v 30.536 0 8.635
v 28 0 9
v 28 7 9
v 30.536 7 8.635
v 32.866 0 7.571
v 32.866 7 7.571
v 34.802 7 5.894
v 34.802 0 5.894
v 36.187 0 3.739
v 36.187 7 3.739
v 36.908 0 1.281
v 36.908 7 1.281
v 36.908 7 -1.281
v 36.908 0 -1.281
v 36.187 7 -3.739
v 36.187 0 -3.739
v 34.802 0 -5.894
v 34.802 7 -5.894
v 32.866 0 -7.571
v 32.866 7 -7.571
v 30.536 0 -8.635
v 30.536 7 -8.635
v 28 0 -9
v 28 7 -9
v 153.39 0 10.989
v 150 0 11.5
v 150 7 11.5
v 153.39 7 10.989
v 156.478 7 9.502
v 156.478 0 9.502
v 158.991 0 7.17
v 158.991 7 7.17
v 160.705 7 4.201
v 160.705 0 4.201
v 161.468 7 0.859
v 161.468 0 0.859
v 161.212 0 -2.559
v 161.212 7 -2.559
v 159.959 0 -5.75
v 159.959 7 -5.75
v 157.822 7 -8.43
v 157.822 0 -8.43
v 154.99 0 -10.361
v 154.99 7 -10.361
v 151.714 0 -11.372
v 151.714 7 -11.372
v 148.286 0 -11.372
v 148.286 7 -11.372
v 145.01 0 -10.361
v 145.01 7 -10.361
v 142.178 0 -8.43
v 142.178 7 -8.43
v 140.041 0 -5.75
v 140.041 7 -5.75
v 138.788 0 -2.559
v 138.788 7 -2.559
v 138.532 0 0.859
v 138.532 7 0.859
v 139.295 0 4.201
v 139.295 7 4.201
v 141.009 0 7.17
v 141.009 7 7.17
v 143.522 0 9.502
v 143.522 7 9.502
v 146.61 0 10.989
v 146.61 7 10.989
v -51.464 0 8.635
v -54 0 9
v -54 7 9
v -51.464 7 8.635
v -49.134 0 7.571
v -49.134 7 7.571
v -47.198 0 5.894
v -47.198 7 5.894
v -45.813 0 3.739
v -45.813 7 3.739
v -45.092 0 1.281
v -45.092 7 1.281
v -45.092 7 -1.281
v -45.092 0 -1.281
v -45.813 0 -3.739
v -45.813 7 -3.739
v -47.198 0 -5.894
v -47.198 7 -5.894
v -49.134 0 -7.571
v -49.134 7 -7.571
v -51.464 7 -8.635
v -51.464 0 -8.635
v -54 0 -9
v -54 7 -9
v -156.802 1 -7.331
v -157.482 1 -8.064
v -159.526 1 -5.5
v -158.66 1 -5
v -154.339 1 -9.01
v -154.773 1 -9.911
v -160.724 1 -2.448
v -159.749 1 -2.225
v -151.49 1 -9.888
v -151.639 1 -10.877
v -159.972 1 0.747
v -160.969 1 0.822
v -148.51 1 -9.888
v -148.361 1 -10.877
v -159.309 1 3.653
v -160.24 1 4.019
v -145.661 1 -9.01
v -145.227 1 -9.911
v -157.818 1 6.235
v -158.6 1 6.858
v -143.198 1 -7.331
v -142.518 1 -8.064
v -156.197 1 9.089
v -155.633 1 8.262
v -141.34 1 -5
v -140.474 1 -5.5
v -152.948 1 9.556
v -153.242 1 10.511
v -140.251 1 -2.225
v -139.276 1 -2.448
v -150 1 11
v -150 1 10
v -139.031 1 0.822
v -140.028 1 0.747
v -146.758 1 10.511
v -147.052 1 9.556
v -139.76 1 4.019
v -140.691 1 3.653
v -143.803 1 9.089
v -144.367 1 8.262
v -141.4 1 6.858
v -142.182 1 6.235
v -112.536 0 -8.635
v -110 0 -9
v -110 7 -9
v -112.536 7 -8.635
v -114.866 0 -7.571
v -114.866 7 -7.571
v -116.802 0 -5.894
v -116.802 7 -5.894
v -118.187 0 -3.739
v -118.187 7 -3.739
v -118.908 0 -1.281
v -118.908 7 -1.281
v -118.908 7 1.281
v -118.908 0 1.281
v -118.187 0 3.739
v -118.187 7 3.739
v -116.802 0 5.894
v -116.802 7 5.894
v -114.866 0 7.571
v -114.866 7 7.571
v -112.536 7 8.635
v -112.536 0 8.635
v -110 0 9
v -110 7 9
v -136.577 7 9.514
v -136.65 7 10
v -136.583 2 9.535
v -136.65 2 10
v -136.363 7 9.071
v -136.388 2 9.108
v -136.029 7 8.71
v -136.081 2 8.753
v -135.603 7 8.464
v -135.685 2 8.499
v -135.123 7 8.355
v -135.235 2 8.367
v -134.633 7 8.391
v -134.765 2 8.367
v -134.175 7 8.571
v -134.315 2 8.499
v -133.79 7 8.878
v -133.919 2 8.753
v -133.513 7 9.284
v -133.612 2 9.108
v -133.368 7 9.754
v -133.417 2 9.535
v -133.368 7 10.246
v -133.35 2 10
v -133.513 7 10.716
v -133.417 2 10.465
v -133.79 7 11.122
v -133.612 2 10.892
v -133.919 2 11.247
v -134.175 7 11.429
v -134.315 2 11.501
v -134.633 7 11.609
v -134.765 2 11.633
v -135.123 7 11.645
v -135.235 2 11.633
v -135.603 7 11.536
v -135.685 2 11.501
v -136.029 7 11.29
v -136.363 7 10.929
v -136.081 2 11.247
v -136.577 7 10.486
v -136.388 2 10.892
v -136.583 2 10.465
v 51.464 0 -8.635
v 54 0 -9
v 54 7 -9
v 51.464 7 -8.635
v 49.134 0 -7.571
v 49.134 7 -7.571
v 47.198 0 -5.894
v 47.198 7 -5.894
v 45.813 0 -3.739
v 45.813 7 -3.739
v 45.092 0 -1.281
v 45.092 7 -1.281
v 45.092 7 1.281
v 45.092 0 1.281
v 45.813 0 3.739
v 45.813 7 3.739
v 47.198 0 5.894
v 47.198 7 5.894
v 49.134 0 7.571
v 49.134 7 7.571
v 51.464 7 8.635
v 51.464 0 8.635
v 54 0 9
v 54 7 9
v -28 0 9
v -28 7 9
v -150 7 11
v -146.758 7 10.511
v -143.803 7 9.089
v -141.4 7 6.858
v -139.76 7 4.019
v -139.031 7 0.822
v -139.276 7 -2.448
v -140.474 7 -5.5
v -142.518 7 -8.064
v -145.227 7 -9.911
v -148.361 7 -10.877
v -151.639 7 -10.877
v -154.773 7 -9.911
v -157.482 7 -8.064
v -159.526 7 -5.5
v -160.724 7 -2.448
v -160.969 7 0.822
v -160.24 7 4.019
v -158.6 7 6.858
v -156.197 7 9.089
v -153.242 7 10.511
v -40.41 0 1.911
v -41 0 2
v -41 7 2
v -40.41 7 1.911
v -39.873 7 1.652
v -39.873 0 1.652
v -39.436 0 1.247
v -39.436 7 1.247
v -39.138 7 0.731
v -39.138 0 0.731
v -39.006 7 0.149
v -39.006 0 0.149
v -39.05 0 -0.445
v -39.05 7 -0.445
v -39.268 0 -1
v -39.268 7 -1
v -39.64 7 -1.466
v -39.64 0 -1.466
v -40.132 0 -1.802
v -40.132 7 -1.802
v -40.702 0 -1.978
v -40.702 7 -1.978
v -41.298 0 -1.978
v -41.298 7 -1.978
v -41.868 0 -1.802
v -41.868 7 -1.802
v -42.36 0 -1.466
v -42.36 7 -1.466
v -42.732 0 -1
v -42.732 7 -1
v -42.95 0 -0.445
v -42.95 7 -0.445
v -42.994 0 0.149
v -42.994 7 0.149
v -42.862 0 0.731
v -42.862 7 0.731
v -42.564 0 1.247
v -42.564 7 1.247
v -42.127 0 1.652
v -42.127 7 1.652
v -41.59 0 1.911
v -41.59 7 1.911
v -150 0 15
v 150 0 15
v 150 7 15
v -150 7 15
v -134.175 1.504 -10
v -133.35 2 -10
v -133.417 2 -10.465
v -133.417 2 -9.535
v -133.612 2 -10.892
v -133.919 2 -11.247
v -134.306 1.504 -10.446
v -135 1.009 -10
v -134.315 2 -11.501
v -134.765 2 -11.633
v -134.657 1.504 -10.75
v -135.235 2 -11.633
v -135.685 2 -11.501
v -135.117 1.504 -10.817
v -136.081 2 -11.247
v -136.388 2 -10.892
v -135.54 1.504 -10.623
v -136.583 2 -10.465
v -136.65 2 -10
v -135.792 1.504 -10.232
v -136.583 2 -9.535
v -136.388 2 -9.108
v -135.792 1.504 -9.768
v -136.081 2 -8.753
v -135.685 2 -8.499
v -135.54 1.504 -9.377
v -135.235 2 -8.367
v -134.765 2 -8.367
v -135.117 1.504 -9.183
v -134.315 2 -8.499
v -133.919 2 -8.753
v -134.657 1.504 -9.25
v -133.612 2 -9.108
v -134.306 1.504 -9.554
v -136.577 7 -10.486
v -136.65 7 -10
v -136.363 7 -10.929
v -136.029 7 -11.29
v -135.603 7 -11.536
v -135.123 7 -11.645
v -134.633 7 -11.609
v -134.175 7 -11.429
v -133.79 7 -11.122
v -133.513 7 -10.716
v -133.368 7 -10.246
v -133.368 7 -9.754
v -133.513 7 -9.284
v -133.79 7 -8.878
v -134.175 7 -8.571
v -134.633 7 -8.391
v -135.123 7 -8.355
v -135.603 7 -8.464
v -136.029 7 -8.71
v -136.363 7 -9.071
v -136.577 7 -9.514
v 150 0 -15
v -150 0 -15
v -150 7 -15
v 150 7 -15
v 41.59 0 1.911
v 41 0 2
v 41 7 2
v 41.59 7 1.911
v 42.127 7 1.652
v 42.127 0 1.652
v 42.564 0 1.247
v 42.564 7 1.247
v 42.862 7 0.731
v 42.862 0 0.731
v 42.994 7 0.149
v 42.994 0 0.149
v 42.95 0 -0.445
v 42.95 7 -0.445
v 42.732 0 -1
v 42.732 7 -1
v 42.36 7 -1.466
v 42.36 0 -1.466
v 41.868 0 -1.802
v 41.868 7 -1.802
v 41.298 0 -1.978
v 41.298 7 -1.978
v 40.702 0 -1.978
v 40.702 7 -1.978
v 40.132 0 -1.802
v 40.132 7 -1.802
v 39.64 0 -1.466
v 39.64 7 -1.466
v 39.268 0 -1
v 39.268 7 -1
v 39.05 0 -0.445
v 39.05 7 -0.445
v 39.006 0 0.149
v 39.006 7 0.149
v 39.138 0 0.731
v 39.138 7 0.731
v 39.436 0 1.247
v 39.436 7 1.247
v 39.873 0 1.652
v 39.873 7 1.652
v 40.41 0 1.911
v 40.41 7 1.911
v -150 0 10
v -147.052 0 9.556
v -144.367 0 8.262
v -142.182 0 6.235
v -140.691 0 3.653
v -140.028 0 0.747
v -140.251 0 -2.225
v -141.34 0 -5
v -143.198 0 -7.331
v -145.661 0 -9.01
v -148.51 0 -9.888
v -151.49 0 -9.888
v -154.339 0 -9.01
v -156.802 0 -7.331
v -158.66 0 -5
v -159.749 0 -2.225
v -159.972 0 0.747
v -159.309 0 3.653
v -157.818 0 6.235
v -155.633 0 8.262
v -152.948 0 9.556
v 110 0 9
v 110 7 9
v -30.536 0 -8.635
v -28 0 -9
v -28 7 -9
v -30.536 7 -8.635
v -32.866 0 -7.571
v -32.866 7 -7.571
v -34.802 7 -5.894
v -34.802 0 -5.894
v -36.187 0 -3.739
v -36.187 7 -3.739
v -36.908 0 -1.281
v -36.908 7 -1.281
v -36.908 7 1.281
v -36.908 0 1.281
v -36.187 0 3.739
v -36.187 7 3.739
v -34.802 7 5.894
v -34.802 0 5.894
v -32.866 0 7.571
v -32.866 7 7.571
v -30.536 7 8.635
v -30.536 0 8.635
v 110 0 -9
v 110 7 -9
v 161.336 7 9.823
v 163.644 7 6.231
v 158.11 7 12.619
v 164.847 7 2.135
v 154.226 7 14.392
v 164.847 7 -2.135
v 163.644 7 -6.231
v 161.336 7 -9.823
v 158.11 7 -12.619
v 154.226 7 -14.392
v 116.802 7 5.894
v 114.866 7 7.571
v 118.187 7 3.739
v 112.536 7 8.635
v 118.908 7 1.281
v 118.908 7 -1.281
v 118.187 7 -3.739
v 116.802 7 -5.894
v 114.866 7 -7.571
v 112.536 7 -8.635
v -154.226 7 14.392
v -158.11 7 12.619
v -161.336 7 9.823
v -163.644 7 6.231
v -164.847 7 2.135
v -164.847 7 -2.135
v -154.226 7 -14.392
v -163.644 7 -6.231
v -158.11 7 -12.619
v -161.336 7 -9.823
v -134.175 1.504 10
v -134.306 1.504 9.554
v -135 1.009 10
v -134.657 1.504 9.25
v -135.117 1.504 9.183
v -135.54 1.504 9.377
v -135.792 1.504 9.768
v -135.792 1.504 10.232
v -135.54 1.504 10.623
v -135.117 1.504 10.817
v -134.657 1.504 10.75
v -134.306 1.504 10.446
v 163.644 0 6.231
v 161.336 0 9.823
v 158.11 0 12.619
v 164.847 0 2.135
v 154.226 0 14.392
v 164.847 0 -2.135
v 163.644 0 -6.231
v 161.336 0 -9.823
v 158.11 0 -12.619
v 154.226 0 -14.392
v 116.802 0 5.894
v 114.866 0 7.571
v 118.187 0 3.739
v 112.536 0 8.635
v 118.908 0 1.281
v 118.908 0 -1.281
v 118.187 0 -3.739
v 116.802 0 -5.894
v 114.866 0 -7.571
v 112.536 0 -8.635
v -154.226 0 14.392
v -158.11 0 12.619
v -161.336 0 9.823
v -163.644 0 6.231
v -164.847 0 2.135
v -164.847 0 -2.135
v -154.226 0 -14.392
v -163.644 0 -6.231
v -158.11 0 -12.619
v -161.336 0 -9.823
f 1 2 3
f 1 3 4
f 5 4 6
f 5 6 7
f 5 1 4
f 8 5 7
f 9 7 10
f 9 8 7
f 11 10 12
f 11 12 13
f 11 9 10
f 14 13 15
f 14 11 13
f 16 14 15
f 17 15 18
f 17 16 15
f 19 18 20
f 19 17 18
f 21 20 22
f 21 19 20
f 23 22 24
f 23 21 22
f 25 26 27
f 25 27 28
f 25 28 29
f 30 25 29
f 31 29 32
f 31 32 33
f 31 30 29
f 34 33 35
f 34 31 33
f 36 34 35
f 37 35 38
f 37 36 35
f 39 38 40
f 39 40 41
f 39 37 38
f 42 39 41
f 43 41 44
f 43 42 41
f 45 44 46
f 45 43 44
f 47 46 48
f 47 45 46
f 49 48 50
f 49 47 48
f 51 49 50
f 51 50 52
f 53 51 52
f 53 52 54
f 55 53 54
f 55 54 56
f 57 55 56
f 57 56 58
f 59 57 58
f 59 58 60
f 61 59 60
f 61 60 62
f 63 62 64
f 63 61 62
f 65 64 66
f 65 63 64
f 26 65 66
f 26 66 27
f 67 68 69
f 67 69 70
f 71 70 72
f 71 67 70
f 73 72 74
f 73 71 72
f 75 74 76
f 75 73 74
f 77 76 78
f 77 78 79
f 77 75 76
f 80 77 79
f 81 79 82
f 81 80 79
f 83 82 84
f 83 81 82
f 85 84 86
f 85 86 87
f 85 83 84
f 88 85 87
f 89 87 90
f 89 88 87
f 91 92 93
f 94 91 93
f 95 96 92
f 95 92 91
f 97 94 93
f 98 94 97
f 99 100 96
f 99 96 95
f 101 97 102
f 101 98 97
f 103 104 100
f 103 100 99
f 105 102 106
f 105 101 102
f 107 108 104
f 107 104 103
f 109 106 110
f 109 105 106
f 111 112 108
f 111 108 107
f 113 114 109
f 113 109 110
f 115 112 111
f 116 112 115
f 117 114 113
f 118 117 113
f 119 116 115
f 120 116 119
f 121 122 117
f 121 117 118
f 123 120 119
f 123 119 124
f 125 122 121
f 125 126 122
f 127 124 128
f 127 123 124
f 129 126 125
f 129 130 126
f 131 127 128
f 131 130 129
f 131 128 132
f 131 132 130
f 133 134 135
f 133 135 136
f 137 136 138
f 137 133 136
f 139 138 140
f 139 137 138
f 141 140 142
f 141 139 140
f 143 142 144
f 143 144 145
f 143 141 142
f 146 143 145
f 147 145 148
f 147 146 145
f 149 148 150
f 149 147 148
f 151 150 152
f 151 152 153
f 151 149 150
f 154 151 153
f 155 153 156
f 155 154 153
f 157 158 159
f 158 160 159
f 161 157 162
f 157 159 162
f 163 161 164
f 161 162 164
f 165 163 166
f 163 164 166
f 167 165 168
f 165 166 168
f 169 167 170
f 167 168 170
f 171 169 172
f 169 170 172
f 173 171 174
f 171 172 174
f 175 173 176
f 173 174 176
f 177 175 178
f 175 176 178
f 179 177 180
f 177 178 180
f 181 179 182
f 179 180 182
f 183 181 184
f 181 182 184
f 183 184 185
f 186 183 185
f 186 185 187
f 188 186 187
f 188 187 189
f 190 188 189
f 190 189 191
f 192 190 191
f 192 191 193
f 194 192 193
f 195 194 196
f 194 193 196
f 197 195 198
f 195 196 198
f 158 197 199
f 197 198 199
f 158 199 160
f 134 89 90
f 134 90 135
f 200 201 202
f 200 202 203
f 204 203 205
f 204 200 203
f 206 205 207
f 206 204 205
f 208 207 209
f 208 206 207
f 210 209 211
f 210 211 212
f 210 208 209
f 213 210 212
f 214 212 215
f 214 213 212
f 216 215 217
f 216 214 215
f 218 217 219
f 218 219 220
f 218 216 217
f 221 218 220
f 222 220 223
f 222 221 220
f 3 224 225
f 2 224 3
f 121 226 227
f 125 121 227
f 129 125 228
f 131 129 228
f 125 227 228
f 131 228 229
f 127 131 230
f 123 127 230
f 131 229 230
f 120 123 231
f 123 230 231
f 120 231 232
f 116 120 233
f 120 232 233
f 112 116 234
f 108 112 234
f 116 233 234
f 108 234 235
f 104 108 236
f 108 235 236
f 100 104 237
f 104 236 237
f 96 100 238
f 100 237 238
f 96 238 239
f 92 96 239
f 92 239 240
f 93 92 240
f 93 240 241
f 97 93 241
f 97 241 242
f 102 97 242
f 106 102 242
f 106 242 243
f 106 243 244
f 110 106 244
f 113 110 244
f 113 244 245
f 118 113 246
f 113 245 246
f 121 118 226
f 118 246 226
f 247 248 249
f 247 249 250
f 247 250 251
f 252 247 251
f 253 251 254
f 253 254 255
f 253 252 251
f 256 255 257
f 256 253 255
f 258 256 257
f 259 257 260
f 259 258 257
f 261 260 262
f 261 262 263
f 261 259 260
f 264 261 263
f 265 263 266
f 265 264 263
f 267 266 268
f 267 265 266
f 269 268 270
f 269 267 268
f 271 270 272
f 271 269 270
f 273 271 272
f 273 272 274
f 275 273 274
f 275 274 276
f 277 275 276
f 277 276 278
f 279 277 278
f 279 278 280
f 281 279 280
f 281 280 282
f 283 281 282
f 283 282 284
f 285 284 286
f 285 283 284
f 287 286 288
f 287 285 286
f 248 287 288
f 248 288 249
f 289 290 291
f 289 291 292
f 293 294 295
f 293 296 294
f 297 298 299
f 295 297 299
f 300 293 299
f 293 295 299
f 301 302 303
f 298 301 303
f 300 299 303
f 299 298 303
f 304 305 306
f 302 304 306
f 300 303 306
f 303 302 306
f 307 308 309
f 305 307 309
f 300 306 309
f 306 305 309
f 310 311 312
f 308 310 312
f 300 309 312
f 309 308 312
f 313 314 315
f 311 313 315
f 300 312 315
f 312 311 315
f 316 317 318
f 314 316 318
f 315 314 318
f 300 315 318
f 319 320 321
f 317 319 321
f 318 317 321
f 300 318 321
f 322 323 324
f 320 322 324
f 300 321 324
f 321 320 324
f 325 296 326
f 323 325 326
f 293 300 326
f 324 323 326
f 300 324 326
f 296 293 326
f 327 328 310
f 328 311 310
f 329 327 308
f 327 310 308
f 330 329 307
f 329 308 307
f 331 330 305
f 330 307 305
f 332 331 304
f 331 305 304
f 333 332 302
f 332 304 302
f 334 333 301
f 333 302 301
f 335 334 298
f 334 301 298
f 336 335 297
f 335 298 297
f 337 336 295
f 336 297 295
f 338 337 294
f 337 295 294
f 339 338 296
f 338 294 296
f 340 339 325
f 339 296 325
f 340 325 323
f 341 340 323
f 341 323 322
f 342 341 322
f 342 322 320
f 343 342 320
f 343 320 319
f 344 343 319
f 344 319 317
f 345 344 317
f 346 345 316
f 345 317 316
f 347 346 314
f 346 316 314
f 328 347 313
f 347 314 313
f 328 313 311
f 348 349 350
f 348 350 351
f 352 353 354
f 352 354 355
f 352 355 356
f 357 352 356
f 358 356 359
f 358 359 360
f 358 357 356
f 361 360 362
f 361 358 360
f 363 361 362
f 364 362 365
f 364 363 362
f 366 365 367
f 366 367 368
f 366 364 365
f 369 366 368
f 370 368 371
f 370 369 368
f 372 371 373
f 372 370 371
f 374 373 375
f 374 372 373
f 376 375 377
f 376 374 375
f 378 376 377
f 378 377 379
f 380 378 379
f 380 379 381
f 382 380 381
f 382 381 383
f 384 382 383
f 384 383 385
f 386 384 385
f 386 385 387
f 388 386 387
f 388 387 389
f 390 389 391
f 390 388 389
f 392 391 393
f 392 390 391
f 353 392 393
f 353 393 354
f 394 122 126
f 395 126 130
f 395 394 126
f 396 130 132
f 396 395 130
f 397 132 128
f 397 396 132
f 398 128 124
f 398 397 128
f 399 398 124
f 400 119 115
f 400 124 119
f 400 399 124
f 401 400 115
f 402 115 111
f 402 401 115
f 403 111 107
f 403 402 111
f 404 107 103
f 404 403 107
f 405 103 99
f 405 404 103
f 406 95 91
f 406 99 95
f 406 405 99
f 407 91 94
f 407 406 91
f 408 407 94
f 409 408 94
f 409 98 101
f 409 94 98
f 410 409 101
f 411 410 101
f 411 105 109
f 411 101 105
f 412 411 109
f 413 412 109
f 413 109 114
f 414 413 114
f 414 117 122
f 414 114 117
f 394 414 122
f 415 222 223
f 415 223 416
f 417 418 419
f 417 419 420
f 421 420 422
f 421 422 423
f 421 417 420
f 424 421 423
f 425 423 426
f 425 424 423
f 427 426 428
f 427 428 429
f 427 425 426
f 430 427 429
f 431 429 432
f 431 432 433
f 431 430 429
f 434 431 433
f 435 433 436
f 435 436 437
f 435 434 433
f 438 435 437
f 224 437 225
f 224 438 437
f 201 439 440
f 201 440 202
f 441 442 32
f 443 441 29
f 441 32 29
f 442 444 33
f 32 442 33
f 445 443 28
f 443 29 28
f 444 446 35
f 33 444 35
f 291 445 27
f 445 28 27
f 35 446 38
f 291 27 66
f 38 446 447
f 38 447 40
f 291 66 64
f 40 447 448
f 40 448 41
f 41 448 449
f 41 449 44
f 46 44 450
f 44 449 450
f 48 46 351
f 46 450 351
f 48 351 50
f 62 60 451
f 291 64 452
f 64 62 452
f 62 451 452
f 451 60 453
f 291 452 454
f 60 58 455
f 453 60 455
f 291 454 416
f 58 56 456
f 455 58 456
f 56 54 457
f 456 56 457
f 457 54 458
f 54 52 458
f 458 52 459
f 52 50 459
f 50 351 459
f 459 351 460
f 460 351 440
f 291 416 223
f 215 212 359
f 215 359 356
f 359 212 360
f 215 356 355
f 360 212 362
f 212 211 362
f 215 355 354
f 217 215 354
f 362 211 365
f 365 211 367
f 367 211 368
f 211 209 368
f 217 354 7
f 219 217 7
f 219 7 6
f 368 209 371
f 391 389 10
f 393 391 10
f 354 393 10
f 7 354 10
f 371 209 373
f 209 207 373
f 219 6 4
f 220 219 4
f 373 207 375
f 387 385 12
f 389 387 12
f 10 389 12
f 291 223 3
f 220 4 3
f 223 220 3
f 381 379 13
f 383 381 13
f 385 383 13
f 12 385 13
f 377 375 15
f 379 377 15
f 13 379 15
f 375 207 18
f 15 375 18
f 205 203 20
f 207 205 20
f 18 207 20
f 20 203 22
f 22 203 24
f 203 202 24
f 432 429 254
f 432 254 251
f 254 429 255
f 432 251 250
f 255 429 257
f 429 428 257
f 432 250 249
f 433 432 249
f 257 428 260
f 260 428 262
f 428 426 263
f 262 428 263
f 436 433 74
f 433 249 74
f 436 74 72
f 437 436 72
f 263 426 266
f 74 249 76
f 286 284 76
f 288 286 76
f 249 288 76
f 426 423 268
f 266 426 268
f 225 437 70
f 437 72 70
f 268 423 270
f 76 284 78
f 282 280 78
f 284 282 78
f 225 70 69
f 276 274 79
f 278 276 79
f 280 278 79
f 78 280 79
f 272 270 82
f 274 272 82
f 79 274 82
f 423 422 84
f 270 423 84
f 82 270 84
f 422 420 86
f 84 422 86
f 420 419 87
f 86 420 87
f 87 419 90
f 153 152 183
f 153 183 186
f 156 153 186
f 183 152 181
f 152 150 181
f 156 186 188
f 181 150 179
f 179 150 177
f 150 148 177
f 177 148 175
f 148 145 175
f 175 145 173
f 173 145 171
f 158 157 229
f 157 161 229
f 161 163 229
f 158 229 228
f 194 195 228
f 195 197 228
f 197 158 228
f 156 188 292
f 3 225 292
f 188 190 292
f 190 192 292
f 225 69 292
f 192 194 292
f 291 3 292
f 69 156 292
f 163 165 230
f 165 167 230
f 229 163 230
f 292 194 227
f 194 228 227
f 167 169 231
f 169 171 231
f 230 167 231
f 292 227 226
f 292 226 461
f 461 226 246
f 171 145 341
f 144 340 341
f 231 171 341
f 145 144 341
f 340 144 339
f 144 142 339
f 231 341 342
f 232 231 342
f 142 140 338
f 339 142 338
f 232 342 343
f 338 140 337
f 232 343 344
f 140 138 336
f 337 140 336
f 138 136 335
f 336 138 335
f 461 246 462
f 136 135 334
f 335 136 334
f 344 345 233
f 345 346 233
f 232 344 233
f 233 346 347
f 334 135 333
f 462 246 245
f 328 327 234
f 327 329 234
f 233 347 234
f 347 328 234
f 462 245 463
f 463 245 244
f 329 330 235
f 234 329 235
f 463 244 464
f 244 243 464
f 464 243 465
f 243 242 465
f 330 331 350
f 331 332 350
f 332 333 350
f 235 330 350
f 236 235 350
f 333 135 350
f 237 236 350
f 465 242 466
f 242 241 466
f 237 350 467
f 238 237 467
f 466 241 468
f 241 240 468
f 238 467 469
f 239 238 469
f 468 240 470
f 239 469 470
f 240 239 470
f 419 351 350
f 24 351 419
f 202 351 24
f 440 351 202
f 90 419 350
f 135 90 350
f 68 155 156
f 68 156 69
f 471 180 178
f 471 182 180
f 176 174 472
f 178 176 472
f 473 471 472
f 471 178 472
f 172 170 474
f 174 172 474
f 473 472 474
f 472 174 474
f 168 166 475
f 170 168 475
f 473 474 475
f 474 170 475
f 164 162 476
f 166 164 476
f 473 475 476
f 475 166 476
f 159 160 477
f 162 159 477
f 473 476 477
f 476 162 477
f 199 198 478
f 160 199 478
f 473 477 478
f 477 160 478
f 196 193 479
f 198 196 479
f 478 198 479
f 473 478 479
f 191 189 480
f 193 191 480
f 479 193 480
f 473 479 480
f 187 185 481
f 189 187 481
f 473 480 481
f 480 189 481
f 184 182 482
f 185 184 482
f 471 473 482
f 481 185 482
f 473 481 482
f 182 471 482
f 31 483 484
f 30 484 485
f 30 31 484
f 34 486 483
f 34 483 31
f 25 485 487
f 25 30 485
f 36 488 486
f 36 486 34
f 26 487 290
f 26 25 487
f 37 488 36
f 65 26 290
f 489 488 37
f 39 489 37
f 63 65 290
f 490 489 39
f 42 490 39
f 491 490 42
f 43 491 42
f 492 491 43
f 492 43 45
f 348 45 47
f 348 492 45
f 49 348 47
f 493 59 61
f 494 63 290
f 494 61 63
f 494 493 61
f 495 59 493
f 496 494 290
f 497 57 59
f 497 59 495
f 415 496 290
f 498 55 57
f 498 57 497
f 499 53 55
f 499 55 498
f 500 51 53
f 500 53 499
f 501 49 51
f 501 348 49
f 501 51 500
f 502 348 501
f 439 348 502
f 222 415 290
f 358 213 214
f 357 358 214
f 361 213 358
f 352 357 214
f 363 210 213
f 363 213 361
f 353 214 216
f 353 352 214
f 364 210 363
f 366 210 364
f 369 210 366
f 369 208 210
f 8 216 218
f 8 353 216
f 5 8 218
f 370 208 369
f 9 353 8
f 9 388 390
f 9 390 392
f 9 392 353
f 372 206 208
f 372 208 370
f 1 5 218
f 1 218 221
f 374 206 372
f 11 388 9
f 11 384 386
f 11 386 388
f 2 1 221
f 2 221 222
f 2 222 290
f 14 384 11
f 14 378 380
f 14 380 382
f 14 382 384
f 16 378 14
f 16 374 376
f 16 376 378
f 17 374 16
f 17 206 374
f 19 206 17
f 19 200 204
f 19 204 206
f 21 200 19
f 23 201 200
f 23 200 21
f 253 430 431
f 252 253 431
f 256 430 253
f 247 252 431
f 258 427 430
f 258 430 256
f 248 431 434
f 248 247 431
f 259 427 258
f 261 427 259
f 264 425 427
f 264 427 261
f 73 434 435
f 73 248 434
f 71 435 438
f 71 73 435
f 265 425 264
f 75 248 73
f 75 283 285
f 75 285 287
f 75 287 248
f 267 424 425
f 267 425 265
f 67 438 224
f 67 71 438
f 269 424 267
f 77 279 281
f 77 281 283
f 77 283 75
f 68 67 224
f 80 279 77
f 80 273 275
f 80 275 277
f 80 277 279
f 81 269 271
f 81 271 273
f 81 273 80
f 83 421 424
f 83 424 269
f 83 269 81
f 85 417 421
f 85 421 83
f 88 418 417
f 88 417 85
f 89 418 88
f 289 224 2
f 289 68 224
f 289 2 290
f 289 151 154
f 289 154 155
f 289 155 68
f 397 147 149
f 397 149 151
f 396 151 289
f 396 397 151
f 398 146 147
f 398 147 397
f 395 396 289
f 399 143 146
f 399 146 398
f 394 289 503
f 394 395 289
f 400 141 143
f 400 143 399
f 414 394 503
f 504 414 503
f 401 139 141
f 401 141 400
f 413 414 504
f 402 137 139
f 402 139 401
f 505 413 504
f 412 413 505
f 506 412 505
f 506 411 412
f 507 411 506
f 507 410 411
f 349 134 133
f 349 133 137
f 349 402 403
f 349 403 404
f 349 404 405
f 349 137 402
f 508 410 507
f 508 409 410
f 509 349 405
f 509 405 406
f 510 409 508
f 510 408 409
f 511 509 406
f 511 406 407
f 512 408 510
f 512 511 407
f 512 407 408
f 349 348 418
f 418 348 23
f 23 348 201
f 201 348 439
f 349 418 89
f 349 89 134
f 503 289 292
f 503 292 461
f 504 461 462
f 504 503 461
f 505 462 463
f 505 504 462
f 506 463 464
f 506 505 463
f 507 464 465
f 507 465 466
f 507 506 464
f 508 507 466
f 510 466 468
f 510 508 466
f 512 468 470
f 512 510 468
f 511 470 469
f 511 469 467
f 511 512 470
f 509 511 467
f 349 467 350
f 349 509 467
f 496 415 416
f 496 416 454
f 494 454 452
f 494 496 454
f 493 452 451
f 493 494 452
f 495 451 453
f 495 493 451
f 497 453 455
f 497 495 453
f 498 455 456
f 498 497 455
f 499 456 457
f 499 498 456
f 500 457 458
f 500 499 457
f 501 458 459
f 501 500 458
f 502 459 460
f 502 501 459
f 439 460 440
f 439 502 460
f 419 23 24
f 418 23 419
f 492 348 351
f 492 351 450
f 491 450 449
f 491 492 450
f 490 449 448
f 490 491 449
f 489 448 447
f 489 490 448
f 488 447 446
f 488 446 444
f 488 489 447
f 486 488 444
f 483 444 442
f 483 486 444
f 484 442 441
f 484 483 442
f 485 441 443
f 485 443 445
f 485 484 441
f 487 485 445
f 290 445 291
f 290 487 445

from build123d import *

# Parameters (mm, degrees)
SKETCH1_R             = 11.5
SKETCH1_R_2           = 10
SKETCH1_R_3           = 2
BOSS_EXTRUDE1_DEPTH   = 7
SKETCH2_R             = 11
CUT_EXTRUDE1_DEPTH    = 6
M4_TAPPED_HOLE1_D     = 3.3
M4_TAPPED_HOLE1_DEPTH = 5
M4_TAPPED_HOLE1_TIP   = 0.991420021


with BuildPart() as part:
    # Sketch1 → Boss-Extrude1 (new body)
    with BuildSketch(Plane(origin=(0, 0, 0), x_dir=(1, 0, 0), z_dir=(0, 1, 0))):
        with BuildLine():
            Line((150, -15), (-150, -15))
            ThreePointArc((-150, -15), (-165, 0), (-150, 15))
            Line((-150, 15), (150, 15))
            ThreePointArc((150, 15), (165, 0), (150, -15))
        make_face()
        with Locations(Location((150, 0, 0), (0, 0, 270))):
            Circle(SKETCH1_R, mode=Mode.SUBTRACT)
        with Locations(Location((-150, 0, 0), (0, 0, 270))):
            Circle(SKETCH1_R_2, mode=Mode.SUBTRACT)
        with Locations(Location((40.999999907, 0, 0), (0, 0, 270))):
            Circle(SKETCH1_R_3, mode=Mode.SUBTRACT)
        with Locations(Location((-40.99999998, 0, 0), (0, 0, 270))):
            Circle(SKETCH1_R_3, mode=Mode.SUBTRACT)
        with BuildLine():
            Line((109.999999927, 9), (53.999999907, 9))
            ThreePointArc((53.999999907, 9), (44.999999907, 0), (53.999999907, -9))
            Line((53.999999907, -9), (109.999999927, -9))
            ThreePointArc((109.999999927, -9), (119, 0), (109.999999927, 9))
        make_face(mode=Mode.SUBTRACT)
        with BuildLine():
            Line((27.999999907, 9), (-28.000000112, 9))
            ThreePointArc((-28.000000112, 9), (-36.99999998, 0), (-28.000000112, -9))
            Line((-28.000000112, -9), (27.999999907, -9))
            ThreePointArc((27.999999907, -9), (36.999999907, 0), (27.999999907, 9))
        make_face(mode=Mode.SUBTRACT)
        with BuildLine():
            Line((-53.99999998, 9), (-110, 9))
            ThreePointArc((-110, 9), (-119, 0), (-110, -9))
            Line((-110, -9), (-53.99999998, -9))
            ThreePointArc((-53.99999998, -9), (-44.99999998, 0), (-53.99999998, 9))
        make_face(mode=Mode.SUBTRACT)
    extrude(amount=BOSS_EXTRUDE1_DEPTH)

    # Sketch2 → Cut-Extrude1 (cut)
    with BuildSketch(Plane(origin=(0, 7, 0), x_dir=(1, 0, 0), z_dir=(0, 1, 0))):
        with Locations(Location((-150, 0, 0), (0, 0, 270))):
            Circle(SKETCH2_R)
    extrude(amount=-CUT_EXTRUDE1_DEPTH, mode=Mode.SUBTRACT)

    # M4 Tapped Hole1
    with Locations(Plane(origin=(0, 7, 0), x_dir=(1, 0, 0), z_dir=(0, 1, 0))):
        with Locations((-135, 10), (-135, -10)):
            Hole(M4_TAPPED_HOLE1_D / 2, depth=M4_TAPPED_HOLE1_DEPTH)
            with Locations((0, 0, -(M4_TAPPED_HOLE1_DEPTH + M4_TAPPED_HOLE1_TIP / 2))):  # 118° drill point
                Cone(0, M4_TAPPED_HOLE1_D / 2, M4_TAPPED_HOLE1_TIP, mode=Mode.SUBTRACT)


solid = part.part
